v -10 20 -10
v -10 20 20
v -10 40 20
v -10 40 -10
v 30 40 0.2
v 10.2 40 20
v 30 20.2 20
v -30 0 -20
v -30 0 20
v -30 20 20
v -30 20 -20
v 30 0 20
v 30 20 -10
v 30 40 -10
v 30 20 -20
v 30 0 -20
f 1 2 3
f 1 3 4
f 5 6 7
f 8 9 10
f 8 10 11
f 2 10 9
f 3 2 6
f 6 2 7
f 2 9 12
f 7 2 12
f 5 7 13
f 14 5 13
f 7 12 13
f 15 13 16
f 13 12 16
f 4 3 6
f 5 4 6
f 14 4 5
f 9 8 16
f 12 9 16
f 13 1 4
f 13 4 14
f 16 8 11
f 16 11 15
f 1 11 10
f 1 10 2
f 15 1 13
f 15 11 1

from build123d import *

# Parameters (mm, degrees)
CROQUIS1_W              = 60
CROQUIS1_H              = 40
SALIENTE_EXTRUIR2_DEPTH = 20
CROQUIS3_W              = 40
CROQUIS3_H              = 30
SALIENTE_EXTRUIR3_DEPTH = 20
CHAFL_N1_START          = 40.529988897
CHAFL_N1_OUTLINE_W      = 28
CHAFL_N1_OUTLINE_H      = 31
CHAFL_N1_DEPTH          = 12.470011103


with BuildPart() as part:
    # Croquis1 → Saliente-Extruir2 (new body)
    with BuildSketch(Plane(origin=(0, 0, 0), x_dir=(1, 0, 0), z_dir=(0, 1, 0))):
        Rectangle(CROQUIS1_W, CROQUIS1_H)
    extrude(amount=SALIENTE_EXTRUIR2_DEPTH)

    # Croquis3 → Saliente-Extruir3 (add)
    with BuildSketch(Plane(origin=(0, 20, 0), x_dir=(1, 0, 0), z_dir=(0, 1, 0))):
        with Locations((10, -5)):
            Rectangle(CROQUIS3_W, CROQUIS3_H)
    extrude(amount=SALIENTE_EXTRUIR3_DEPTH)

    # Chaflán1: read off the stored shape, not the designer's step
    # Chaflán1 outline → Chaflán1 (cut)
    with BuildSketch(Plane(origin=(0, 0, 0), x_dir=(0.8164965809277258, -0.40824829046386313, -0.40824829046386313), z_dir=(0.5773502691896258, 0.5773502691896258, 0.5773502691896258)).offset(CHAFL_N1_START)):
        with Locations((-4, 14.5)):
            Rectangle(CHAFL_N1_OUTLINE_W, CHAFL_N1_OUTLINE_H)
    extrude(amount=CHAFL_N1_DEPTH, mode=Mode.SUBTRACT)


solid = part.part
